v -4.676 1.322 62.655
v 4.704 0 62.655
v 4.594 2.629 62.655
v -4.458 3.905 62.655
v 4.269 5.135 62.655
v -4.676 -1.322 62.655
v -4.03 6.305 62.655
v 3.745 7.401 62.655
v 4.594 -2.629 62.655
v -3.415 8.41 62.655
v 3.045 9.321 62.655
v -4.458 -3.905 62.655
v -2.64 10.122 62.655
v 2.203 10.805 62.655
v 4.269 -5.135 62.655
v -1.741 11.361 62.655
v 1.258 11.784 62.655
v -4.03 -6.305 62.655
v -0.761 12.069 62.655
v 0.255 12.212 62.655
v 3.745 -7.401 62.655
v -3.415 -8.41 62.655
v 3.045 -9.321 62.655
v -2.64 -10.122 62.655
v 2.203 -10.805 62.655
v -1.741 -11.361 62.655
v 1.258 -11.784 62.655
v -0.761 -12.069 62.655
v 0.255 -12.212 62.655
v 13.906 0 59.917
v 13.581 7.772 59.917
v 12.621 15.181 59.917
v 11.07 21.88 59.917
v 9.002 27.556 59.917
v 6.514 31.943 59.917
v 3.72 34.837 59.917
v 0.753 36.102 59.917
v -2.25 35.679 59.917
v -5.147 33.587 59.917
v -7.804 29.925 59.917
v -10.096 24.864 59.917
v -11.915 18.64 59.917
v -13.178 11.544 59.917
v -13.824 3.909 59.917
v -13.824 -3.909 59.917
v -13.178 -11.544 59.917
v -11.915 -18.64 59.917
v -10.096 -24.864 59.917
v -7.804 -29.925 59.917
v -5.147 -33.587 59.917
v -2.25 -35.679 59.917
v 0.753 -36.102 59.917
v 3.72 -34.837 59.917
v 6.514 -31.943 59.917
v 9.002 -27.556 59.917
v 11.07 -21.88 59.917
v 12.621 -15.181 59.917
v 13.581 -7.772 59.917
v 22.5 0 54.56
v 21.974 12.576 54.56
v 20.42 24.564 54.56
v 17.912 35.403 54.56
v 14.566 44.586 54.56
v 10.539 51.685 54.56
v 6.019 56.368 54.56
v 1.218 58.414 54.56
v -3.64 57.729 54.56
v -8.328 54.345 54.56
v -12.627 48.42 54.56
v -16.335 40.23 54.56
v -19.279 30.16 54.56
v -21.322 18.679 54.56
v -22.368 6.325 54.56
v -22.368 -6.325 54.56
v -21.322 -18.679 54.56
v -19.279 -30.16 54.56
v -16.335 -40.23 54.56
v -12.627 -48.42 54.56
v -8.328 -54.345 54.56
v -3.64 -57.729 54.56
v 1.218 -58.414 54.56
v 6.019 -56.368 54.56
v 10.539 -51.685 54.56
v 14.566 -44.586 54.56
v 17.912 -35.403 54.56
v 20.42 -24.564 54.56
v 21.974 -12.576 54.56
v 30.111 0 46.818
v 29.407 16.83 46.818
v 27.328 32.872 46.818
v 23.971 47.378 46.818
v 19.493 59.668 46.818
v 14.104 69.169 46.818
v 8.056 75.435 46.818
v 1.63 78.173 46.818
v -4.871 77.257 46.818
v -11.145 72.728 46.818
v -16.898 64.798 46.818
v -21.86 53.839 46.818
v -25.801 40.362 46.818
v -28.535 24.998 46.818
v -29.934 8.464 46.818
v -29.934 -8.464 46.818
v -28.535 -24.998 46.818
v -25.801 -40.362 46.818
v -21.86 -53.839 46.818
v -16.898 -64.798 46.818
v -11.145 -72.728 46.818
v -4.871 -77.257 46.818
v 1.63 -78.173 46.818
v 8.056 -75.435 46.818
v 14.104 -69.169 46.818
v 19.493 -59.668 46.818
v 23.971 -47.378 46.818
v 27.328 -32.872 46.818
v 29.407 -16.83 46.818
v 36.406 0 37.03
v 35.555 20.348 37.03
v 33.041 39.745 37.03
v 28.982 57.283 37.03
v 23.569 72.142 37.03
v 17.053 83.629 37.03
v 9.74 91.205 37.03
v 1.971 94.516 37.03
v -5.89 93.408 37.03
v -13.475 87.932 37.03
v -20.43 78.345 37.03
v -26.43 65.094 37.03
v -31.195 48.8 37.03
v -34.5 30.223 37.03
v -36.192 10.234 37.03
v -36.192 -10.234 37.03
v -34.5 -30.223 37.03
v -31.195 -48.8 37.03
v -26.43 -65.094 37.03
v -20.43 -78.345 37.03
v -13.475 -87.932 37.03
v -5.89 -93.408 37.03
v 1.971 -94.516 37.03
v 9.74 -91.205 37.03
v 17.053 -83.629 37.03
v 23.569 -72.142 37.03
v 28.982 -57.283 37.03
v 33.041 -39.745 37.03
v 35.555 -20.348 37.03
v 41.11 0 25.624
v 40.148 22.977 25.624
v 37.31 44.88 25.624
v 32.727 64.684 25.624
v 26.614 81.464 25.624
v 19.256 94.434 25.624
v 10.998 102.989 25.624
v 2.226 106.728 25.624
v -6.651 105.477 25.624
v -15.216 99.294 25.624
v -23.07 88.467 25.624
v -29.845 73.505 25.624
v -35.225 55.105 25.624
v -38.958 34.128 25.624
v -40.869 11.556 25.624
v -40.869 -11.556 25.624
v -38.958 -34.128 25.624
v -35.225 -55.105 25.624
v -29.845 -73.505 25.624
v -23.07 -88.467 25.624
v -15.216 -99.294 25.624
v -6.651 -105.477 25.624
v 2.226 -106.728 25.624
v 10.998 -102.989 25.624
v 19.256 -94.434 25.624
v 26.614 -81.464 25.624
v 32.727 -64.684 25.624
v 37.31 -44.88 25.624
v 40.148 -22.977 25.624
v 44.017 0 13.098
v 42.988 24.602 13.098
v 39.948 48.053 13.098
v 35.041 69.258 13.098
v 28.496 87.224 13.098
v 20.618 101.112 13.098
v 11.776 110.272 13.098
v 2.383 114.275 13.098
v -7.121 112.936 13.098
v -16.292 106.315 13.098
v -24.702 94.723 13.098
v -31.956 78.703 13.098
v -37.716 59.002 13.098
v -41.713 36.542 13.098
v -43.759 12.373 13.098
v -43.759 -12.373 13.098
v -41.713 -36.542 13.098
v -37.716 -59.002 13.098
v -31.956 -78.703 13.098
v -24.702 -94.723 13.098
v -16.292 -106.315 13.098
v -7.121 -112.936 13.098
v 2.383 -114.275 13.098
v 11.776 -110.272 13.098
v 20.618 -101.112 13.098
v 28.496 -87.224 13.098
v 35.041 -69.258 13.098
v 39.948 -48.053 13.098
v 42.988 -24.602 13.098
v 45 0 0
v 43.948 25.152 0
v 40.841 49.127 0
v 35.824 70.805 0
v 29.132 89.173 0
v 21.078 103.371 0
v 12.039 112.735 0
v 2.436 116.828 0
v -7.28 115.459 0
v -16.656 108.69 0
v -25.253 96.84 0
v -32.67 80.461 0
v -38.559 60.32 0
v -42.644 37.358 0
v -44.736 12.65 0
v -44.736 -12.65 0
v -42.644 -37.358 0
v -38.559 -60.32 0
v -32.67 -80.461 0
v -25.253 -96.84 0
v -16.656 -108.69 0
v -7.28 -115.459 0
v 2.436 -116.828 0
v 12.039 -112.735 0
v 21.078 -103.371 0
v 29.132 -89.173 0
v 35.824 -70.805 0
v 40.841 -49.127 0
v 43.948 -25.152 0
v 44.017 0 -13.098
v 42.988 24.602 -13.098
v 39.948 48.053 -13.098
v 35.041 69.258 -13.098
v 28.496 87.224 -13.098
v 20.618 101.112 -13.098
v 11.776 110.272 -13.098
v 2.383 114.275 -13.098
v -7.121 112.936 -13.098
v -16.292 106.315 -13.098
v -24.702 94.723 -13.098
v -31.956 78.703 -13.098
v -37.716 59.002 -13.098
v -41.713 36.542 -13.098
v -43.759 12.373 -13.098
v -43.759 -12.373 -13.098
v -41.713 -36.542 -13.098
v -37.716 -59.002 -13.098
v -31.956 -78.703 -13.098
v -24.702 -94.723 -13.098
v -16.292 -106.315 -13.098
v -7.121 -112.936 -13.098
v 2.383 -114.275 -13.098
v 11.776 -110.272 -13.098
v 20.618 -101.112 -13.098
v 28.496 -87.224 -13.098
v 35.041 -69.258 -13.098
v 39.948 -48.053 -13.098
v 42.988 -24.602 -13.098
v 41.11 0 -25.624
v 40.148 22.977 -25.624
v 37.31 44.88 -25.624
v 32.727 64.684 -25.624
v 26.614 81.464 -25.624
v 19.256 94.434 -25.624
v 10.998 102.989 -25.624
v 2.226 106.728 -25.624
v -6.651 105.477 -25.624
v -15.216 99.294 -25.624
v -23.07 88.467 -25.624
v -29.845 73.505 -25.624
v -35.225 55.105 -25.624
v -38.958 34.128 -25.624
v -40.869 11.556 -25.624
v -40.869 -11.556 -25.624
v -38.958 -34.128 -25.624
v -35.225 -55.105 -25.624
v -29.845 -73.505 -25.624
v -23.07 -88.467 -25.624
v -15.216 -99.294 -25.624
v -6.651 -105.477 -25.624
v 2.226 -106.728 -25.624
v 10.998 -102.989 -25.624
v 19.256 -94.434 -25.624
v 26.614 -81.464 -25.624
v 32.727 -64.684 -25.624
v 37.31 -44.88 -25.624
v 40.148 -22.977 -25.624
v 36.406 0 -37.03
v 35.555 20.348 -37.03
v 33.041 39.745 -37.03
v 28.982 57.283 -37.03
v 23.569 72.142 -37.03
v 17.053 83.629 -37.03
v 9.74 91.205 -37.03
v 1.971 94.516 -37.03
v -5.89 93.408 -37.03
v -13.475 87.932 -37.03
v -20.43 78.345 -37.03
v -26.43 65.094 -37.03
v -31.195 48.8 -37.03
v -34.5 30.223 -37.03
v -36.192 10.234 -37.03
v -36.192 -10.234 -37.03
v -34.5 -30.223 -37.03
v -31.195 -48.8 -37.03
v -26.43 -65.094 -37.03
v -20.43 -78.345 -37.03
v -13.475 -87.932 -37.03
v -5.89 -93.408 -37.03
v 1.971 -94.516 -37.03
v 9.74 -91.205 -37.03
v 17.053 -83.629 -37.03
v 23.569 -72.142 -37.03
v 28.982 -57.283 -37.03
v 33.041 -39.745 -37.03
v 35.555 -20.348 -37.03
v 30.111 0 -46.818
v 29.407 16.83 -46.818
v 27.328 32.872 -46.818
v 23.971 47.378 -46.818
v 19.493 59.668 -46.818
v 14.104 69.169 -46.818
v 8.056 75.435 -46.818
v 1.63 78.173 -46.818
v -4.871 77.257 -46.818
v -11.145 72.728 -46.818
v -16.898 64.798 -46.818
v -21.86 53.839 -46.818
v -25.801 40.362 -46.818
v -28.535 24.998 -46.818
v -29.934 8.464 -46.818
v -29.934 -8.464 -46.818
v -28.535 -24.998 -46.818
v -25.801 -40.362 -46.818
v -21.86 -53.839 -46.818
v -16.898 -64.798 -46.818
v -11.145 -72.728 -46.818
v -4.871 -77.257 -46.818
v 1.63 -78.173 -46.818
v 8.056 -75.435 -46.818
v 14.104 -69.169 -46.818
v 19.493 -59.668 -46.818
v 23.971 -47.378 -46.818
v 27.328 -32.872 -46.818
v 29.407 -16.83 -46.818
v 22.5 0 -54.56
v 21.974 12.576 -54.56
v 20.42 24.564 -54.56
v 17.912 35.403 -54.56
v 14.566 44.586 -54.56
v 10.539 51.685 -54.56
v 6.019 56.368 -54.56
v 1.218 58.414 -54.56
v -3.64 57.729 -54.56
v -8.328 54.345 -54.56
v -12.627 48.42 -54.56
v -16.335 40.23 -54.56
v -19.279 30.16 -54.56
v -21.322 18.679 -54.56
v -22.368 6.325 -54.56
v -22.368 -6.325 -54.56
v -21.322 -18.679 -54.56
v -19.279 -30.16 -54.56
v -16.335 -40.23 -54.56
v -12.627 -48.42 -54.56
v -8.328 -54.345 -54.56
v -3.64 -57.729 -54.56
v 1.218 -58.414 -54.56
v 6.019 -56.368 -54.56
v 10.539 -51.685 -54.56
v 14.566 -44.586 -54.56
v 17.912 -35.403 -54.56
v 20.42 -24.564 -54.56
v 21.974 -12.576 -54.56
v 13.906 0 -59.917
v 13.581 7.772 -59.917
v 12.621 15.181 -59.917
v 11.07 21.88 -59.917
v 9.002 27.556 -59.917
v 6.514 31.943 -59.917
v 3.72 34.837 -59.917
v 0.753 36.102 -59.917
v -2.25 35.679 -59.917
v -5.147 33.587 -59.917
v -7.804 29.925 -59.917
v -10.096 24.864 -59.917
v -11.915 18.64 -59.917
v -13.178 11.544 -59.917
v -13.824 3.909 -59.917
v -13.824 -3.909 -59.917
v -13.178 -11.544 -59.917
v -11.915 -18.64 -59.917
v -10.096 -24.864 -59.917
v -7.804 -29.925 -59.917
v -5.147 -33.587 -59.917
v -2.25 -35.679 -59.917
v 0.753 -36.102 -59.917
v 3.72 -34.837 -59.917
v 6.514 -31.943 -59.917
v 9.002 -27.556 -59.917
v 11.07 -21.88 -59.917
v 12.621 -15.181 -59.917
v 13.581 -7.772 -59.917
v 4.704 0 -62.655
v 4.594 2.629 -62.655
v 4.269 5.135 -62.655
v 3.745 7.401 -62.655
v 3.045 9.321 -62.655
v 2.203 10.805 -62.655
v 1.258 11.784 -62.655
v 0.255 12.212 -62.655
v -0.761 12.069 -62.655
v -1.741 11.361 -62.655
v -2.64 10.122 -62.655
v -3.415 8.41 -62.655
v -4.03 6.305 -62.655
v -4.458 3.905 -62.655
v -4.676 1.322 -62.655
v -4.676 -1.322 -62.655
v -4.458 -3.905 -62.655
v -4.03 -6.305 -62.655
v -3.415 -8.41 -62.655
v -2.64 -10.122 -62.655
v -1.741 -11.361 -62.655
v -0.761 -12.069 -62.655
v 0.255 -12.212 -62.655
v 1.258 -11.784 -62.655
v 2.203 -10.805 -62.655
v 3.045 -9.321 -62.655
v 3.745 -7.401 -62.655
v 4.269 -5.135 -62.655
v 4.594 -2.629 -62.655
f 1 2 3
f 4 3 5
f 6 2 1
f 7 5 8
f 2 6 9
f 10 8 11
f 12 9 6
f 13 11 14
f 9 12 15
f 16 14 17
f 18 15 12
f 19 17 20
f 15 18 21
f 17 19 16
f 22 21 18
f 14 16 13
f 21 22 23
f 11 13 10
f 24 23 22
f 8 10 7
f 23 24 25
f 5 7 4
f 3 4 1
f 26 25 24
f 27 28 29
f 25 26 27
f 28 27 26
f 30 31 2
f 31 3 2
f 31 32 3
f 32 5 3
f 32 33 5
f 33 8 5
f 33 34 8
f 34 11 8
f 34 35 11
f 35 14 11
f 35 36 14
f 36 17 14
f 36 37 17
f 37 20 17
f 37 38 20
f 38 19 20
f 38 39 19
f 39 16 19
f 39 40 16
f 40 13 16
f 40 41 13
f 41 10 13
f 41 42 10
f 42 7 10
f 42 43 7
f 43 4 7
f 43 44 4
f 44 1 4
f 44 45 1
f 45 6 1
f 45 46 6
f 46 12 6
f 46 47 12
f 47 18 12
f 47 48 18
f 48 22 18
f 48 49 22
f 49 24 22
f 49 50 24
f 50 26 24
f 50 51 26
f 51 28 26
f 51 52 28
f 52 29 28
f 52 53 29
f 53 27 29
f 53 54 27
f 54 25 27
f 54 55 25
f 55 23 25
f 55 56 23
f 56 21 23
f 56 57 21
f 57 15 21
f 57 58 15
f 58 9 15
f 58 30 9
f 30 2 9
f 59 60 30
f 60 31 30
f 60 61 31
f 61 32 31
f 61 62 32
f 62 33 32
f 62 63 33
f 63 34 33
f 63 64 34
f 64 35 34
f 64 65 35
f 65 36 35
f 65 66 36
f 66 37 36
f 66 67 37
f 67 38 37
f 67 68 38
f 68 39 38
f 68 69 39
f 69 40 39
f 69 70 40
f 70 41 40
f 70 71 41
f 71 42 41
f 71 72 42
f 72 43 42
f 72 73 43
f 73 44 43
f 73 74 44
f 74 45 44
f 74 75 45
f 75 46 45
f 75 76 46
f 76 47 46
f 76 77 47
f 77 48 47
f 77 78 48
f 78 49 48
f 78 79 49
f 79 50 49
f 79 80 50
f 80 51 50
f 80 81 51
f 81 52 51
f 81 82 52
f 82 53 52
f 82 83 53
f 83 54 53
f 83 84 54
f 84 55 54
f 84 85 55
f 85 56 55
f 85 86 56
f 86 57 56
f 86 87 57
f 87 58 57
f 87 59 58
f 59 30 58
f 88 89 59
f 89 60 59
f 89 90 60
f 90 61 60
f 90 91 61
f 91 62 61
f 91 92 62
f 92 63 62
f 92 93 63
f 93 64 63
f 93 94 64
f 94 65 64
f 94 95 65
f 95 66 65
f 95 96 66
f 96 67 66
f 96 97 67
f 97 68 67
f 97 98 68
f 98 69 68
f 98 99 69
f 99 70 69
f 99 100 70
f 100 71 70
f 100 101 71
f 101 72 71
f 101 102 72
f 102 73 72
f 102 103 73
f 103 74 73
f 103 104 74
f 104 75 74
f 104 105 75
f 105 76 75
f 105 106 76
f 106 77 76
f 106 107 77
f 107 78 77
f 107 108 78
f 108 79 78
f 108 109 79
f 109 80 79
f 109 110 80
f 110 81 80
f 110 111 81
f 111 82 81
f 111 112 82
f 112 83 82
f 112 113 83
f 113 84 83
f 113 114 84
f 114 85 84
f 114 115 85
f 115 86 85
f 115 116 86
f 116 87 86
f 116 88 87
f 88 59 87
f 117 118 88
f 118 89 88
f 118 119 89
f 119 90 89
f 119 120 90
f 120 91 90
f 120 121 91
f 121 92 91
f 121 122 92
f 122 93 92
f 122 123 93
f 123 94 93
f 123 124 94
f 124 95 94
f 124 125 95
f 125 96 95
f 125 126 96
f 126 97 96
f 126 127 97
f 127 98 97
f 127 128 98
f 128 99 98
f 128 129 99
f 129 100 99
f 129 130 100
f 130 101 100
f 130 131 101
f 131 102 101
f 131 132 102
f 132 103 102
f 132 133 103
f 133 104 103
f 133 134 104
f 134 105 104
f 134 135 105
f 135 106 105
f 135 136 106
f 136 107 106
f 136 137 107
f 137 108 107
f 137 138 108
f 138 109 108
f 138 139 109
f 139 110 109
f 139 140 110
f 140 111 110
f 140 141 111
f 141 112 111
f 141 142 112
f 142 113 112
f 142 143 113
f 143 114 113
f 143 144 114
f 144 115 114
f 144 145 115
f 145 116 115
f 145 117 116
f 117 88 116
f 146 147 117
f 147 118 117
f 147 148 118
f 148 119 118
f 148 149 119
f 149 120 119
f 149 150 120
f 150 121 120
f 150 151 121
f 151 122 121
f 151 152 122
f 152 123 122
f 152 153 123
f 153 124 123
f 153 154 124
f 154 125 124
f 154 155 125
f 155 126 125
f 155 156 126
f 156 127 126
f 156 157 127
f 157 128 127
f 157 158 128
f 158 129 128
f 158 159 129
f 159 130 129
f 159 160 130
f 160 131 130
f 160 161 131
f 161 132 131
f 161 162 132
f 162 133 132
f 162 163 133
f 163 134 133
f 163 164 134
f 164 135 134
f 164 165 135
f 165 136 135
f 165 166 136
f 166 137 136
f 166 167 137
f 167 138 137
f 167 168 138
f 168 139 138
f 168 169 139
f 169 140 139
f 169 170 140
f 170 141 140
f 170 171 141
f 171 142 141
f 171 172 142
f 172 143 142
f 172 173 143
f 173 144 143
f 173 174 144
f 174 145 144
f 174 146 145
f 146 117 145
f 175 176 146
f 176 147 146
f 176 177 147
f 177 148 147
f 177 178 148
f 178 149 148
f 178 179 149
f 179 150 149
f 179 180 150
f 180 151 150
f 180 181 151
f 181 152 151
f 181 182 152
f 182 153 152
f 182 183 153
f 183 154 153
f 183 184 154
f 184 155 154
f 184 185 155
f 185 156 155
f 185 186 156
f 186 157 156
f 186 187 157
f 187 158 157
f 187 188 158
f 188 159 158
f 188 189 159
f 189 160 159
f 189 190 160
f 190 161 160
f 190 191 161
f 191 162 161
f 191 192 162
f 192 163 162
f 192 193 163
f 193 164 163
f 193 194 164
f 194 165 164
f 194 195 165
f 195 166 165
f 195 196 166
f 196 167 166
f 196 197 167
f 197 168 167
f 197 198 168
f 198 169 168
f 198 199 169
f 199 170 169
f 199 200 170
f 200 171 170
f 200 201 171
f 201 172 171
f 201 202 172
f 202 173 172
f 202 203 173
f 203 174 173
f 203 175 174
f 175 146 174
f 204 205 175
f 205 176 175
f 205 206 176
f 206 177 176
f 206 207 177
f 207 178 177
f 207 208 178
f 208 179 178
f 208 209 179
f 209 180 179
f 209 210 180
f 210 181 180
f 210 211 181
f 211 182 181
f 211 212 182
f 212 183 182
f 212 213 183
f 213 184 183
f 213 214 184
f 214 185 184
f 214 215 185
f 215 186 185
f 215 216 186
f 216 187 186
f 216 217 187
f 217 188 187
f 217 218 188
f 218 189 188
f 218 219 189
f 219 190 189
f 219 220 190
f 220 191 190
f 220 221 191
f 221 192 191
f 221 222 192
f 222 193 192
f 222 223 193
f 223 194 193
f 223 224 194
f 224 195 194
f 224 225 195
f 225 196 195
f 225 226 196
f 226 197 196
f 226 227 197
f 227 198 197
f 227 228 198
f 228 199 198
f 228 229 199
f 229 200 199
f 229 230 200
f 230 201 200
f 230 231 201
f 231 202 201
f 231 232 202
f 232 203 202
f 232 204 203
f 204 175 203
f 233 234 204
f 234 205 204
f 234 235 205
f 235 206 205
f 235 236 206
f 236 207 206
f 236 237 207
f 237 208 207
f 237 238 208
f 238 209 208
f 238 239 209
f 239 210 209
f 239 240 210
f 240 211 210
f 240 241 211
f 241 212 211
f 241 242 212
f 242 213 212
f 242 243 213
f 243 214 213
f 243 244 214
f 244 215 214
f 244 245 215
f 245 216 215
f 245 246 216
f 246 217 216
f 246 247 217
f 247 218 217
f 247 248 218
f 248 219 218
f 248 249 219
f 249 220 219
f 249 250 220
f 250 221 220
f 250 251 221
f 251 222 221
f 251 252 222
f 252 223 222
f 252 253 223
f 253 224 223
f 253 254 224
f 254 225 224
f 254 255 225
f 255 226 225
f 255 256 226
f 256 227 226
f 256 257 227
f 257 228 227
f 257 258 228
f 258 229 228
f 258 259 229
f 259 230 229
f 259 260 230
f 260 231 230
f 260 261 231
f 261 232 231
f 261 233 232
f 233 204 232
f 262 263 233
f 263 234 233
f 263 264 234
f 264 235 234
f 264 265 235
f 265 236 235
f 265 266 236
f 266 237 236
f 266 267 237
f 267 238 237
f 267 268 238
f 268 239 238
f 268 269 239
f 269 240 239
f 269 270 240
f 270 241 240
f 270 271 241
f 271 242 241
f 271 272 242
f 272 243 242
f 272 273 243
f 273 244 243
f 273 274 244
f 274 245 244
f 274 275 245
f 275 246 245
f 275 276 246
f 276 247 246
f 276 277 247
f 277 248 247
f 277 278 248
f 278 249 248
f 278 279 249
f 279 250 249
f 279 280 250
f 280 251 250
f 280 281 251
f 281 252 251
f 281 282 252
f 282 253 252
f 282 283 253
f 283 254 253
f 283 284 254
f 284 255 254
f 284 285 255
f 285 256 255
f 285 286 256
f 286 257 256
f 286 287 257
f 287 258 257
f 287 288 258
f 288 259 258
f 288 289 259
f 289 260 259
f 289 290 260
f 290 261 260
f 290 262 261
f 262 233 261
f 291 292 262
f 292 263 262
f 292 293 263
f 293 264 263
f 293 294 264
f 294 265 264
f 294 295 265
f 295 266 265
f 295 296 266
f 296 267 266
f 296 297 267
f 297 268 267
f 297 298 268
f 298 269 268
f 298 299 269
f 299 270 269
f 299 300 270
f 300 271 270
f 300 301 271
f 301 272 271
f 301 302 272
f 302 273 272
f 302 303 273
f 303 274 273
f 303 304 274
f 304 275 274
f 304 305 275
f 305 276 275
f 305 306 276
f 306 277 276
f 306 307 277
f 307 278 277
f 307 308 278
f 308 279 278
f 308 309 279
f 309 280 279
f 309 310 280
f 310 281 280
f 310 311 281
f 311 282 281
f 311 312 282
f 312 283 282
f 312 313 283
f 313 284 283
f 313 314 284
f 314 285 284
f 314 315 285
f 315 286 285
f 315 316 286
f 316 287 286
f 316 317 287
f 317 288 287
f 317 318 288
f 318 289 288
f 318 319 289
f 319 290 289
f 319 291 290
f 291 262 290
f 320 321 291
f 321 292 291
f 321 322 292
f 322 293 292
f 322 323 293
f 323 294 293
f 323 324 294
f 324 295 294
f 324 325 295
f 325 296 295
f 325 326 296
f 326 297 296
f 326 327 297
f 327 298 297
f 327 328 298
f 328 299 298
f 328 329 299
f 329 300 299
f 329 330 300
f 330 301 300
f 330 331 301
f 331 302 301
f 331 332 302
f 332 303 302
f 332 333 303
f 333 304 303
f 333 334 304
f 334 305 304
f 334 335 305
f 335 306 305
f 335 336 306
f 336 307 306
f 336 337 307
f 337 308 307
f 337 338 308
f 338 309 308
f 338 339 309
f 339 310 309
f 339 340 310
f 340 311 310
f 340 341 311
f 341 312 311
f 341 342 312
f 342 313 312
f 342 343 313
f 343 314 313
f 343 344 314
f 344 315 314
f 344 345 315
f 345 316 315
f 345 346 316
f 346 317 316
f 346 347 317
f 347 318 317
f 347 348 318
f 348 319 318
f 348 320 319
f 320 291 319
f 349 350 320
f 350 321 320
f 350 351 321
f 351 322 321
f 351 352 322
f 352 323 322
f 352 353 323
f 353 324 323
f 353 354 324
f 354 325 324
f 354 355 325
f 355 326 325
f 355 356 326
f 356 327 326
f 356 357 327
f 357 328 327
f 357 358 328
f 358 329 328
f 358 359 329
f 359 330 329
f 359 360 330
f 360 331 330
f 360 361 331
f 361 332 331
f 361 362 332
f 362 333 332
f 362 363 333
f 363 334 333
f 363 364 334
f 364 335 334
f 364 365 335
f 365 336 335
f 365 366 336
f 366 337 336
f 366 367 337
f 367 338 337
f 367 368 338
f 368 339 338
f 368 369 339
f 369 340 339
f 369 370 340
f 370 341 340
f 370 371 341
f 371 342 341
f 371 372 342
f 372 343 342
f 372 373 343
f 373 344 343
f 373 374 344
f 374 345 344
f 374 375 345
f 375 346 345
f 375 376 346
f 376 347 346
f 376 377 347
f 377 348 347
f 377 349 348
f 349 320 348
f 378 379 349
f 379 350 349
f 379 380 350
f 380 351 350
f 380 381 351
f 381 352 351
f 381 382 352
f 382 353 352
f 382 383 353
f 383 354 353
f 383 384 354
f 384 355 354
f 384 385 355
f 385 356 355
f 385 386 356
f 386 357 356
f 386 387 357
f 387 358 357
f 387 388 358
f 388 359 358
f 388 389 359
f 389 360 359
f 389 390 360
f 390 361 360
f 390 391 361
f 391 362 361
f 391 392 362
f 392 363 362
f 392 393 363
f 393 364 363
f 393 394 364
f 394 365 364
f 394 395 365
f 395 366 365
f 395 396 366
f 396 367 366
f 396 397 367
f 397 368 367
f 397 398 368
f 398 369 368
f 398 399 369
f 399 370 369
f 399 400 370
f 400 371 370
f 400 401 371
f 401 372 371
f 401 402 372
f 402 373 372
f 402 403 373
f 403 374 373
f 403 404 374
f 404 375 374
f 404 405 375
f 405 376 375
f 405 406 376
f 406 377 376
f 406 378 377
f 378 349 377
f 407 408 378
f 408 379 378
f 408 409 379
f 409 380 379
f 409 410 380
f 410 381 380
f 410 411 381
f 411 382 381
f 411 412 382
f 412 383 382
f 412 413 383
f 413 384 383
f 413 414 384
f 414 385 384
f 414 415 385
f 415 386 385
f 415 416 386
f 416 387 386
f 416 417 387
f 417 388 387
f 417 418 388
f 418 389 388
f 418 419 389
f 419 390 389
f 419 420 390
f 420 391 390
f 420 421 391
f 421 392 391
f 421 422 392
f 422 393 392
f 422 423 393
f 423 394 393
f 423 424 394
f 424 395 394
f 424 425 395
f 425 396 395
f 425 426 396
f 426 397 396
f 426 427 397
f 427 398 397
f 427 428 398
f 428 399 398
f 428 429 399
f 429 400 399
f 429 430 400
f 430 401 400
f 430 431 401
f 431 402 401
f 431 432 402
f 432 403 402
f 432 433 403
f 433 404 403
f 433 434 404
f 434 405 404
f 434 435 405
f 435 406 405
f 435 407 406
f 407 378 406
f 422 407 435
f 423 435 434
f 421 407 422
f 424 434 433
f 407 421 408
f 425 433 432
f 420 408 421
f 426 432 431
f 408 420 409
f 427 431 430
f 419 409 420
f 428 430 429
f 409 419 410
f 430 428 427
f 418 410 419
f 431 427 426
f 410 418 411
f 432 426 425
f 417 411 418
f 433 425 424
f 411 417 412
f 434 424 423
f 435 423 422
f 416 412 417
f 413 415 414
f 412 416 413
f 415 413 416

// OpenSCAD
// Generated by SolidPython 1.0.1 on 2020-07-29 00:46:46


scale(v = [5, 13, 7]) {
	sphere(r = 9);
}
/***********************************************
*********      SolidPython code:      **********
************************************************
 
# import packages: SolidPython
from solid import *
from solid.utils import *
from itertools import chain, combinations, permutations


class Resize:

    def __init__(self, scad_file):
        self.scad_file = scad_file
        #self.scad_file = import_scad(scad_file)
        # cone/cylinder param:
        self.r1 = 0
        self.r2 = 0
        self.h = 0
        # rectangular prism param:
        self.w = 0
        self.l = 0
        # ellipse param:
        self.r = 0

    # import OpenScad code (file name corresponds to shape)


    # classify shape + parameters
    def assign(self, param1, param2, param3):
        if self.scad_file == 'cone.scad':
            self.r1 = param1
            self.r2 = param2
            self.h = param3
        elif self.scad_file == 'cylinder.scad':
            self.r1 = param1
            self.r2 = param2
            self.h = param3
        elif self.scad_file == 'rectangularPrism.scad':
            self.h = param1
            self.l = param2
            self.w = param3
        else:
            self.r = param1
            self.h = param2

    # resize parameters
    def iterate(self):
        x = range(3, 20, 2)
        i = 1
        if self.scad_file == 'cone.scad':
            tempList = list(permutations(x, 2))
            for temp in tempList:
                param1 = temp[0]
                param2 = temp[1]
                filepath = 'produced_scad_files/' + 'cone' + str(param1) + '_' + str(param2) + '_' + '.scad'
                scad_render_to_file(cylinder(h=param1, r1=param2, r2=0), filepath)

        elif self.scad_file == 'cylinder.scad':
            tempList = list(permutations(x, 3))
            for temp in tempList:
                param1 = temp[0]
                param2 = temp[1]
                filepath = 'produced_scad_files/' + 'cylinder' + str(param1) + '_' + str(param2) + '_' + '.scad'
                scad_render_to_file(cylinder(h=param1, r1=param2, r2=param2), filepath)

        elif self.scad_file == 'rectangularPrism.scad':
            tempList = list(permutations(x, 3))
            for temp in tempList:
                param1 = temp[0]
                param2 = temp[1]
                param3 = temp[2]
                filepath = 'produced_scad_files/' + 'rectangularPrism' + str(param1) + '_' + str(param2) + '_' + str(
                    param3) + '.scad'
                scad_render_to_file(cube(size=(param1, param2, param3)), filepath)

        elif self.scad_file == 'ellipse.scad':
            tempList = list(permutations(x, 4))
            for temp in tempList:
                param1 = temp[0]
                param2 = temp[1]
                param3 = temp[2]
                param4 = temp[3]
                filepath = 'produced_scad_files/' + 'ellipse' + str(param1) + '_' + str(param2) + '_' + str(param3) + '_' + str(param4) + '.scad'
                scad_render_to_file(scale([param1, param2, param3])(sphere(r=param4)), filepath)

    def render_to_scadfile(self):
        scad_render_to_file(scad, 'example.scad') 
 
************************************************/
